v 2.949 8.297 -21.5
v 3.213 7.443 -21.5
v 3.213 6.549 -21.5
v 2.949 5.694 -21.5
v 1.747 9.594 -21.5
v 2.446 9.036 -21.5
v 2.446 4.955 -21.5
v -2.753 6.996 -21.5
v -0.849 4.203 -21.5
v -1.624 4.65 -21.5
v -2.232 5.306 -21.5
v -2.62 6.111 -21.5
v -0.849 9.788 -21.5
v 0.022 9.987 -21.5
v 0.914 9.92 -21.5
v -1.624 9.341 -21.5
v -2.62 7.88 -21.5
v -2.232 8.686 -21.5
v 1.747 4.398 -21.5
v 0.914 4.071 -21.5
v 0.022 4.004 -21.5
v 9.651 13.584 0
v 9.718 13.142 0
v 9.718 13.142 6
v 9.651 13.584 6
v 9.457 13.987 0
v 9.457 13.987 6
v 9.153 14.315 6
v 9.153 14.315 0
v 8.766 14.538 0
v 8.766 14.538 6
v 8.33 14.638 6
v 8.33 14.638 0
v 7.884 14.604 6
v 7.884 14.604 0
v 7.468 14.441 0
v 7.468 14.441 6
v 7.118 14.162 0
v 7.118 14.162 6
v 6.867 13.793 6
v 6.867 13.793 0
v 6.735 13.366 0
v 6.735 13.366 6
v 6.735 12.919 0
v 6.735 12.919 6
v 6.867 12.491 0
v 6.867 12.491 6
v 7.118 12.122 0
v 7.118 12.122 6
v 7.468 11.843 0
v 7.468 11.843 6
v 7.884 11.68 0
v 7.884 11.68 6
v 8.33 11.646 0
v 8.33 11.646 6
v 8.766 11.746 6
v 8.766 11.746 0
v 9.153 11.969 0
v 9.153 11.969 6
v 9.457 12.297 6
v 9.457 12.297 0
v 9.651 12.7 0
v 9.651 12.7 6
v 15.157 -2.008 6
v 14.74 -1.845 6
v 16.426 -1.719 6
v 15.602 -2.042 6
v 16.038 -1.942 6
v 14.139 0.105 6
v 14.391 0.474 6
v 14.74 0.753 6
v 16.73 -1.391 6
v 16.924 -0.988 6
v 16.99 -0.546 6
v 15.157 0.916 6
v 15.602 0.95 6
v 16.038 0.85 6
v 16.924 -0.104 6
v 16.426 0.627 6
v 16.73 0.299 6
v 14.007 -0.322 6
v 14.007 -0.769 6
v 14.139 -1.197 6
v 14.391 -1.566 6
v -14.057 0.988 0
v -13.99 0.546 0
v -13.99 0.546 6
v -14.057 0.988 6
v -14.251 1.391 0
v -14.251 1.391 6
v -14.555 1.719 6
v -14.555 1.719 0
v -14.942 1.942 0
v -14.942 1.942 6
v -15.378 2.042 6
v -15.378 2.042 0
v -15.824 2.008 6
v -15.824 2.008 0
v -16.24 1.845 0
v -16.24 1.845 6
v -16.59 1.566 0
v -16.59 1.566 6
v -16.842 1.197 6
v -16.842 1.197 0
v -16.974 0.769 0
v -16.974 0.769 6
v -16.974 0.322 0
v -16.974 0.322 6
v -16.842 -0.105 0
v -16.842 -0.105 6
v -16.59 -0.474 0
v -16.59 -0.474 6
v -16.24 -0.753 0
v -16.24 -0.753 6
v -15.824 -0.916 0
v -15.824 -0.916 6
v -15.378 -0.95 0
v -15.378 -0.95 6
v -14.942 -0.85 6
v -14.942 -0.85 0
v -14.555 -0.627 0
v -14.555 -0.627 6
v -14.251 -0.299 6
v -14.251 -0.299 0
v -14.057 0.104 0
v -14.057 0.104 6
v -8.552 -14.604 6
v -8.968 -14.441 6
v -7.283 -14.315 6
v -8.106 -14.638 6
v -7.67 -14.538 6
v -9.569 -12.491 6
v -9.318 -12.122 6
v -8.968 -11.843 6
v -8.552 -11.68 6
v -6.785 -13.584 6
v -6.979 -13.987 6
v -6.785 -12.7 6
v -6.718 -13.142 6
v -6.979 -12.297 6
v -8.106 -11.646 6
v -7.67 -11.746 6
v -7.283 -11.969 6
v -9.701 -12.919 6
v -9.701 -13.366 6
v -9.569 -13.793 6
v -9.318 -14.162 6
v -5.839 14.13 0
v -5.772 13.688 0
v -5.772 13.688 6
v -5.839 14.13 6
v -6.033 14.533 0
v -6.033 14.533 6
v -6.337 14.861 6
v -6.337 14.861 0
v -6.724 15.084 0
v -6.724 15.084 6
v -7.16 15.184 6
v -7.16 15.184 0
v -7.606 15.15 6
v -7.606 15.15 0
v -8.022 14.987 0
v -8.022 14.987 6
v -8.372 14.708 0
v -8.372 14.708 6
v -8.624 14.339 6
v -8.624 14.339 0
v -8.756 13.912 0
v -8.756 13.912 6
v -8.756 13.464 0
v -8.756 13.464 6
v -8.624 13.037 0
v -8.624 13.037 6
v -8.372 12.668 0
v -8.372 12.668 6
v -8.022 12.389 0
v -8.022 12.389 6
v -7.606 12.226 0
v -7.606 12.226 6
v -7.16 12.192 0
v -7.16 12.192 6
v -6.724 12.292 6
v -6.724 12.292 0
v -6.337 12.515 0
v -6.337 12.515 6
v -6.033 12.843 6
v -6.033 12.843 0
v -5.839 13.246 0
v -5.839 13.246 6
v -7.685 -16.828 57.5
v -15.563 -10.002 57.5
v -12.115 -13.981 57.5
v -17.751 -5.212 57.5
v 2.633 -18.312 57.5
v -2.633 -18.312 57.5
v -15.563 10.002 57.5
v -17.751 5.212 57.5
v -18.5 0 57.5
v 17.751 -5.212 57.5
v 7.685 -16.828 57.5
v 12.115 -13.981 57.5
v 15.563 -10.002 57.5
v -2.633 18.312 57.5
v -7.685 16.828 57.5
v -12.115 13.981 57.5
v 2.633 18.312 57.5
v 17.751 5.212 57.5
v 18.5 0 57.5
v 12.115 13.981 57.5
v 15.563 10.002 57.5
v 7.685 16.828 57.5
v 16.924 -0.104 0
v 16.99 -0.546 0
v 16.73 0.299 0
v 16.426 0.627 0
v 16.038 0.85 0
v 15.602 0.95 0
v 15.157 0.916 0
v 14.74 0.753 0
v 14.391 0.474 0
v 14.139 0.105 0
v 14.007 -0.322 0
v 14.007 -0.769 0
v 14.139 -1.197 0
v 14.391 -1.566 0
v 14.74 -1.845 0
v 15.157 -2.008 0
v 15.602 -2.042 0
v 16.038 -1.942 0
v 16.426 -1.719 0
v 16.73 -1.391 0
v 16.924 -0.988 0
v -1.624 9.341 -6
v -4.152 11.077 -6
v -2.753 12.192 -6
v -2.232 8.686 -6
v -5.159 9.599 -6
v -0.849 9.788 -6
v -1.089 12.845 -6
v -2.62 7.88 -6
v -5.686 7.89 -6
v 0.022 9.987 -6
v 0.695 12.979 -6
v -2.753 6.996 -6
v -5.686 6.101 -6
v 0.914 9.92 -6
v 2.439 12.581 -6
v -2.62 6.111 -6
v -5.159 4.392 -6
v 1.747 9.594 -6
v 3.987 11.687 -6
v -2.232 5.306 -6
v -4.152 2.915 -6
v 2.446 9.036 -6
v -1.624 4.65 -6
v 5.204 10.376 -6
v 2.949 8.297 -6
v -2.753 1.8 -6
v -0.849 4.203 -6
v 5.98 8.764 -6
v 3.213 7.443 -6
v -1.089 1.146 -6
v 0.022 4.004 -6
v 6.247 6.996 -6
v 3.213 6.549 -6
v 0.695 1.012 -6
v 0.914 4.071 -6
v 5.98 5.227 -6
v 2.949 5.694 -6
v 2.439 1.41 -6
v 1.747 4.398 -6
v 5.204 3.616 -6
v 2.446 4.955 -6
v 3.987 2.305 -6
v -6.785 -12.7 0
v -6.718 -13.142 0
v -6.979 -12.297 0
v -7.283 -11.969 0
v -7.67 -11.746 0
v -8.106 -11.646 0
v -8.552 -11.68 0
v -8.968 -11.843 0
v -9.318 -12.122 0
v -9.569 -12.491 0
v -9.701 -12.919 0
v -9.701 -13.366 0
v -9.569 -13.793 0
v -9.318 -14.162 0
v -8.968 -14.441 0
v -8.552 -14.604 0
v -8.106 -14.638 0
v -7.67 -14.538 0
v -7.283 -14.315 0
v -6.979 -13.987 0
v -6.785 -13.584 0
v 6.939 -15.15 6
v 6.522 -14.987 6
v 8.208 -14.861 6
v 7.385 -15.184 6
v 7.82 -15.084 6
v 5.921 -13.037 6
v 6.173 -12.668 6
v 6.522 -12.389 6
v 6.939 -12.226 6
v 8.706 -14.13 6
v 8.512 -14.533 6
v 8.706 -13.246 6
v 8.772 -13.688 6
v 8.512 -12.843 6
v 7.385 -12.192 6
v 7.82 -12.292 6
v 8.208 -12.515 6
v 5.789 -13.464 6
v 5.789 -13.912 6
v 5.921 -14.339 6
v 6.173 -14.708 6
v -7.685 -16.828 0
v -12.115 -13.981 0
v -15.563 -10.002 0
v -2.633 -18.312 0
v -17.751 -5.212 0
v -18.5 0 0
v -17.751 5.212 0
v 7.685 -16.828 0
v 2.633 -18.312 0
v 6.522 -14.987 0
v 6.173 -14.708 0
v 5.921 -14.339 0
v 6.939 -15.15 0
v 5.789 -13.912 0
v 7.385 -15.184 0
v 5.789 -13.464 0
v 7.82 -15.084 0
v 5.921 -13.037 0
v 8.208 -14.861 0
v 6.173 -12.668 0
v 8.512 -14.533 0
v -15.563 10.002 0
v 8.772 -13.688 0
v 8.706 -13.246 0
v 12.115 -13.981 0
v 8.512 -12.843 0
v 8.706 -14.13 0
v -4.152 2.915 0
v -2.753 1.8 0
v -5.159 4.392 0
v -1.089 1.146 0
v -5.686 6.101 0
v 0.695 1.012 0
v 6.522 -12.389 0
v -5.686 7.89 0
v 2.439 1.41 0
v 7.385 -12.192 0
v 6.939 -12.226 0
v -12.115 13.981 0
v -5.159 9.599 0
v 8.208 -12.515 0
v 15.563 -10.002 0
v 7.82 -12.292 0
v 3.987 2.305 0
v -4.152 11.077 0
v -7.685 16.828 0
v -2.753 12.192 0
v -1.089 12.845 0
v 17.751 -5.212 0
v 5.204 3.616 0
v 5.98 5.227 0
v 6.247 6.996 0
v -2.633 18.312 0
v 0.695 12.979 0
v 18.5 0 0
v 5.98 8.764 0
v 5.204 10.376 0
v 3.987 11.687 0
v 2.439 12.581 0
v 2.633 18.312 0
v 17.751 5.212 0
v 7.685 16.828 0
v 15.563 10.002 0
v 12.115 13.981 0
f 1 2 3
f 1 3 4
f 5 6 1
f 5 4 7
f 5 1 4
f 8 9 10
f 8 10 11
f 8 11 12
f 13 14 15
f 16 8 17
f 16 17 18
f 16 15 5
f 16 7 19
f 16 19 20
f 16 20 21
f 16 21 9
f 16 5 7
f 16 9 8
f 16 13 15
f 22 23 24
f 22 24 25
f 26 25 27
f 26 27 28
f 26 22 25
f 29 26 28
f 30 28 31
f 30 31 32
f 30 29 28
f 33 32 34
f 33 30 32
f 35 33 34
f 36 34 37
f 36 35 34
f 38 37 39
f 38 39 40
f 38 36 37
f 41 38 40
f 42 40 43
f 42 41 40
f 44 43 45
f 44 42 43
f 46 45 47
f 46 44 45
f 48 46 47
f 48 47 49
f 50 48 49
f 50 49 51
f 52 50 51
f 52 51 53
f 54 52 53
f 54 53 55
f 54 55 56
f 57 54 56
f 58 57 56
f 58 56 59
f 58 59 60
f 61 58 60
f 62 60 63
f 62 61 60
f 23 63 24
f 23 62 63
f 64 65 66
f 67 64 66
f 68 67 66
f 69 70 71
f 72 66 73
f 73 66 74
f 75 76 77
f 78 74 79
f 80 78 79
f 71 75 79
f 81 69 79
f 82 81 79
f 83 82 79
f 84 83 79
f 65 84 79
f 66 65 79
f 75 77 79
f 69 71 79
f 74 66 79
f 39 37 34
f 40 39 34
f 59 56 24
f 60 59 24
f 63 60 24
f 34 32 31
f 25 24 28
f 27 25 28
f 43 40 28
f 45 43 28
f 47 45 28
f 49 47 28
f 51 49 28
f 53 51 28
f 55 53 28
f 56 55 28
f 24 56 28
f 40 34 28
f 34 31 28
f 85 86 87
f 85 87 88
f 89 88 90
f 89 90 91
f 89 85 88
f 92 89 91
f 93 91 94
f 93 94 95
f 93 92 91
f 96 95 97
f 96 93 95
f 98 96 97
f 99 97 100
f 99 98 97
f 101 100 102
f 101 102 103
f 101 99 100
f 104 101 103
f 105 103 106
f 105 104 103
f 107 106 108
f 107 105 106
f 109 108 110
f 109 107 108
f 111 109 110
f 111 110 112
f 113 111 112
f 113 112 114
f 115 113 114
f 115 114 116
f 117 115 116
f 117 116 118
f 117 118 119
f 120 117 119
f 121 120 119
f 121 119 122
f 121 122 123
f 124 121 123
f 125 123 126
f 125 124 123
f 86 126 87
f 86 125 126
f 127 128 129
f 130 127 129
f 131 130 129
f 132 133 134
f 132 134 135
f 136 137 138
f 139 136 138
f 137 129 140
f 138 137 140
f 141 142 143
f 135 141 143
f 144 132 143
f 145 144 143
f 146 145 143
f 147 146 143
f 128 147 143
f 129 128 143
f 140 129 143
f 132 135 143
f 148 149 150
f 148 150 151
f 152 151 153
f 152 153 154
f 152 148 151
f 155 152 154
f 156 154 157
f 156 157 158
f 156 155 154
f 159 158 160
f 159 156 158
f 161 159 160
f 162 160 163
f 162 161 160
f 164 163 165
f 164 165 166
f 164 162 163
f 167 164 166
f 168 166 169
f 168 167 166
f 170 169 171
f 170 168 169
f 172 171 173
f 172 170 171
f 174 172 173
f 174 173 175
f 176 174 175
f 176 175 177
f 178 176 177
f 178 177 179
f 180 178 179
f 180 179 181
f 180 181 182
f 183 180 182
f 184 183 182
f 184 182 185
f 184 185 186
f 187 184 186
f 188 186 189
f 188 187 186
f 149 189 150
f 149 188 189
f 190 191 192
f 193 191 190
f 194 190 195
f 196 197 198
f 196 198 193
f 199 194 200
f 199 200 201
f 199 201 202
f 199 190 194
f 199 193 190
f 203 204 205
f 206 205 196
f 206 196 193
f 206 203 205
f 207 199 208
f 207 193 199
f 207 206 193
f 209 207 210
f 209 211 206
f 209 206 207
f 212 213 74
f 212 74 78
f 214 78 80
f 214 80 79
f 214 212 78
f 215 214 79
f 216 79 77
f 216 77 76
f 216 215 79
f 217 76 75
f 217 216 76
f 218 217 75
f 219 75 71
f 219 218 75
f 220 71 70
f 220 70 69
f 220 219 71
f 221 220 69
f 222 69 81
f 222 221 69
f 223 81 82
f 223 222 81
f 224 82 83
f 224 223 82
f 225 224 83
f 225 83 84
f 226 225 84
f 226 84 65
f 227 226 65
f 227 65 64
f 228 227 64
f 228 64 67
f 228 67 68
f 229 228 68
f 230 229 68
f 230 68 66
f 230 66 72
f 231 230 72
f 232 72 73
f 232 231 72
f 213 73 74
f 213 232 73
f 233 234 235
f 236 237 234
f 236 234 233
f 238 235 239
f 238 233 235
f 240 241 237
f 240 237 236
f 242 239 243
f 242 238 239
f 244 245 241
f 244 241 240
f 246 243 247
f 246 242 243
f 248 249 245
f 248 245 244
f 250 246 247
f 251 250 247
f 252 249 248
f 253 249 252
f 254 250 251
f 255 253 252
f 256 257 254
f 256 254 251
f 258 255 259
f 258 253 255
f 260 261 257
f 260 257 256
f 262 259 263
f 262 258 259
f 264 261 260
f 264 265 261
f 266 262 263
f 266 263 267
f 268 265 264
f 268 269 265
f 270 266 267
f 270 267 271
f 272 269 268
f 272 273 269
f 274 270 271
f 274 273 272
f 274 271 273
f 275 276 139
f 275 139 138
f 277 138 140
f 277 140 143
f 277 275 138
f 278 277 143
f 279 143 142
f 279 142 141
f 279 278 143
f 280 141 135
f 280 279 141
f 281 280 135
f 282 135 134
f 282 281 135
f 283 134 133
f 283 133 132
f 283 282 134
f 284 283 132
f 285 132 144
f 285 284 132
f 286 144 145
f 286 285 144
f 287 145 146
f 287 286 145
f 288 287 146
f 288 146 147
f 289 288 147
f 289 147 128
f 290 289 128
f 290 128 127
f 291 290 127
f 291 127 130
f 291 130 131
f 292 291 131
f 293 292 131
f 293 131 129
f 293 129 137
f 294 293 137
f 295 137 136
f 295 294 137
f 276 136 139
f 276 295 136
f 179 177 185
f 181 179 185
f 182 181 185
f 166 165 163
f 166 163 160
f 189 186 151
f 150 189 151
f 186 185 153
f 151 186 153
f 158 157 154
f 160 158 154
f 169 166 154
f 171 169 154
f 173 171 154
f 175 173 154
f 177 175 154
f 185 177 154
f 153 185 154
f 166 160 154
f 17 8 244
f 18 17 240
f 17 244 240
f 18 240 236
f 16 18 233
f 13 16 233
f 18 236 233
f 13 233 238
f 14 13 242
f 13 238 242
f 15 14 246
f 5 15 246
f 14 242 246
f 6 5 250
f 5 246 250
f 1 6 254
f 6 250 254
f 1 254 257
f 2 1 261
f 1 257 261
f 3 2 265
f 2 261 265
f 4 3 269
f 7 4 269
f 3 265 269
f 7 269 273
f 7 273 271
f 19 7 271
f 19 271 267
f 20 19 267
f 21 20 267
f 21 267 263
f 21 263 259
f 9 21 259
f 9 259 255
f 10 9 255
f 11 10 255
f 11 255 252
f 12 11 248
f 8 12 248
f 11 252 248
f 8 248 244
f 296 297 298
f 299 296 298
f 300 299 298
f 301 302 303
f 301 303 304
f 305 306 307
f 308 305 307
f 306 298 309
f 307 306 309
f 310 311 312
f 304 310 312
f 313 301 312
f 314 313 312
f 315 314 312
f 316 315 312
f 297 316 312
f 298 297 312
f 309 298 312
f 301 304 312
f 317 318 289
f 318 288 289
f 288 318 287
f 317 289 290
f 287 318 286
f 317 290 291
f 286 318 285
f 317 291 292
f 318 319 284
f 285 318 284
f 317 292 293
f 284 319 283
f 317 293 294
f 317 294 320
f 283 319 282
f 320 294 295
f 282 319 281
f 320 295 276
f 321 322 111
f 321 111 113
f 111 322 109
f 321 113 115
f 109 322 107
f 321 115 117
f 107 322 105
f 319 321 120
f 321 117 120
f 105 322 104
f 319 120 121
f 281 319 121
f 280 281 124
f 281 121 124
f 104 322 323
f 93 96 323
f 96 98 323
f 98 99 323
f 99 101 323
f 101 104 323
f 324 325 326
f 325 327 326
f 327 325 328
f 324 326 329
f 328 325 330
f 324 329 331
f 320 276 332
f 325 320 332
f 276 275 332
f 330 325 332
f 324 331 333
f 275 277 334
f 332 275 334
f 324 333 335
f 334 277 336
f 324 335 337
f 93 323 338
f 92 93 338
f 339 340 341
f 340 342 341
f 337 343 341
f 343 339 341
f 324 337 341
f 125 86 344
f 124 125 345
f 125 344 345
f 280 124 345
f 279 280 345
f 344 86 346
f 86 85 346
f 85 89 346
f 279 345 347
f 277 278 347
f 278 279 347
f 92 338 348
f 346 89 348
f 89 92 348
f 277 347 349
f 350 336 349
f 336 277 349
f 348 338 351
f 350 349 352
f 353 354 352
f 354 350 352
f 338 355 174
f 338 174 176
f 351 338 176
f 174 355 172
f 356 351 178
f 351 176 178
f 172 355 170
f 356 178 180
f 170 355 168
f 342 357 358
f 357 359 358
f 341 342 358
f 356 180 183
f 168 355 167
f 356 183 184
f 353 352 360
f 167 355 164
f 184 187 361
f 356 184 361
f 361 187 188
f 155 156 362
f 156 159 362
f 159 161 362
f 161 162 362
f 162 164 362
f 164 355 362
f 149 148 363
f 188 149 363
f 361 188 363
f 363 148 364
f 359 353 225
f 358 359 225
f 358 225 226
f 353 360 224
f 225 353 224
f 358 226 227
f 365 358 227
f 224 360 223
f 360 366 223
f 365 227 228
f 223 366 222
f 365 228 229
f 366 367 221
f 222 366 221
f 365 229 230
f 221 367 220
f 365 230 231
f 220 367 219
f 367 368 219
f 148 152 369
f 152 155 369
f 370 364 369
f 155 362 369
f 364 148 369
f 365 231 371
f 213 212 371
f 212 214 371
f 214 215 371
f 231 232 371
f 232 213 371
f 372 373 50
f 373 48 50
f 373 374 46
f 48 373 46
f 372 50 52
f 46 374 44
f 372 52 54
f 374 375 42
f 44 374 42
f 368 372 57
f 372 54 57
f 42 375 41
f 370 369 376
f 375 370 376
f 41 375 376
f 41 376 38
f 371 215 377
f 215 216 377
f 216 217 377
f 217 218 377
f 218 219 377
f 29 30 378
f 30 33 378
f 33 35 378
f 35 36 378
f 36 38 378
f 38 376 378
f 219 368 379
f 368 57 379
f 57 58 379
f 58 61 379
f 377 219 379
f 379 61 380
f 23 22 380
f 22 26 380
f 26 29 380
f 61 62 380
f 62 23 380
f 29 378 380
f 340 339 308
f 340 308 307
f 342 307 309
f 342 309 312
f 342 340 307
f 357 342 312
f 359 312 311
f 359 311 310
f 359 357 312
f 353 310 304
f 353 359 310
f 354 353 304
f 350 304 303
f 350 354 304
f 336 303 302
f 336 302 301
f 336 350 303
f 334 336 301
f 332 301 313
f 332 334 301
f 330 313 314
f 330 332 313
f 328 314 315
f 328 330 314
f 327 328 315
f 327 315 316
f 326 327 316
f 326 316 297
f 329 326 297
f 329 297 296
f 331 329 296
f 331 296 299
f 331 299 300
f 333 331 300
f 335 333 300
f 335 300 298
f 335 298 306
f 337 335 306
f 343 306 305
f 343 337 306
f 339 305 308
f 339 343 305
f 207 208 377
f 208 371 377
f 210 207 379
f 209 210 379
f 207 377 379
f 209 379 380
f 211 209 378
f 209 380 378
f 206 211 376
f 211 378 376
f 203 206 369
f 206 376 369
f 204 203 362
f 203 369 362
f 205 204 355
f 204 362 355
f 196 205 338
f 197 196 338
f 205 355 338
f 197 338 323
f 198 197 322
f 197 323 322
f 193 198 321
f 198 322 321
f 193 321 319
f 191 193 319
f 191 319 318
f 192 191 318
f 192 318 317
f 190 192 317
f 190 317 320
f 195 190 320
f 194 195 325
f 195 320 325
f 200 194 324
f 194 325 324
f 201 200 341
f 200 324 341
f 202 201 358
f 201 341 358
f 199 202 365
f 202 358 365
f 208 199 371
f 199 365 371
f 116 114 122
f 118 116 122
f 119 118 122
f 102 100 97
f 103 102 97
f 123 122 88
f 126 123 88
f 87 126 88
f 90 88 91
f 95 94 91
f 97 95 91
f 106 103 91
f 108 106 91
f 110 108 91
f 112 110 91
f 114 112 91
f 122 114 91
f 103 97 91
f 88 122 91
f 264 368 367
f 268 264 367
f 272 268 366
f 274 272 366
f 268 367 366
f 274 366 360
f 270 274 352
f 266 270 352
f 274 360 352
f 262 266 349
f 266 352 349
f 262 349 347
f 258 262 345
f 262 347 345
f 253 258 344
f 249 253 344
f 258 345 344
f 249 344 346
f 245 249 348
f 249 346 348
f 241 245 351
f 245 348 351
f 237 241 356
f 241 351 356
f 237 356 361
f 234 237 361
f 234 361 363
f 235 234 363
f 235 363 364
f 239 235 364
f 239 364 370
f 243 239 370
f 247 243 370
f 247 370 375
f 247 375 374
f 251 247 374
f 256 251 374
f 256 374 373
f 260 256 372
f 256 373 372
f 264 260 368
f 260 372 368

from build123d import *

# Parameters (mm, degrees)
SKETCH_1_R          = 18.5
EXTRUDE_1_DEPTH     = 46
SKETCH_1_3_R        = 1.5
CUT_EXTRUDE_1_DEPTH = 6
SKETCH_2_R          = 6
EXTRUDE_2_DEPTH     = 6
SKETCH_3_R          = 3
EXTRUDE_3_DEPTH     = 15.5
SKETCH_5_R          = 18.5
EXTRUDE_4_DEPTH     = 11.5


with BuildPart() as part:
    # 草图1 → 凸台-拉伸1 (new body)
    with BuildSketch(Plane.XY):
        Circle(SKETCH_1_R)
    extrude(amount=EXTRUDE_1_DEPTH)

    # 草图1<3> → 切除-拉伸1 (cut)
    with BuildSketch(Plane.XY):
        with Locations((15.490383309, -0.545916592)):
            Circle(SKETCH_1_3_R)
        with Locations((7.272414017, -13.688023757)):
            Circle(SKETCH_1_3_R)
        with Locations((-8.217969292, -13.142107164)):
            Circle(SKETCH_1_3_R)
        with Locations((-15.490383309, 0.545916592)):
            Circle(SKETCH_1_3_R)
        with Locations((-7.272414017, 13.688023757)):
            Circle(SKETCH_1_3_R)
        with Locations((8.217969292, 13.142107164)):
            Circle(SKETCH_1_3_R)
    extrude(amount=CUT_EXTRUDE_1_DEPTH, mode=Mode.SUBTRACT)

    # 草图2 → 凸台-拉伸2 (add)
    with BuildSketch(Plane(origin=(0, 0, 0), x_dir=(-1, 0, 0), z_dir=(0, 0, -1))):
        with Locations((-0.246542977, 6.995656978)):
            Circle(SKETCH_2_R)
    extrude(amount=EXTRUDE_2_DEPTH)

    # 草图3 → 凸台-拉伸3 (add)
    with BuildSketch(Plane(origin=(0, 0, -6), x_dir=(-1, 0, 0), z_dir=(0, 0, -1))):
        with Locations((-0.246542977, 6.995656978)):
            Circle(SKETCH_3_R)
    extrude(amount=EXTRUDE_3_DEPTH)

    # 草图5 → 凸台-拉伸4 (add)
    with BuildSketch(Plane.XY.offset(46)):
        Circle(SKETCH_5_R)
    extrude(amount=EXTRUDE_4_DEPTH)


solid = part.part
